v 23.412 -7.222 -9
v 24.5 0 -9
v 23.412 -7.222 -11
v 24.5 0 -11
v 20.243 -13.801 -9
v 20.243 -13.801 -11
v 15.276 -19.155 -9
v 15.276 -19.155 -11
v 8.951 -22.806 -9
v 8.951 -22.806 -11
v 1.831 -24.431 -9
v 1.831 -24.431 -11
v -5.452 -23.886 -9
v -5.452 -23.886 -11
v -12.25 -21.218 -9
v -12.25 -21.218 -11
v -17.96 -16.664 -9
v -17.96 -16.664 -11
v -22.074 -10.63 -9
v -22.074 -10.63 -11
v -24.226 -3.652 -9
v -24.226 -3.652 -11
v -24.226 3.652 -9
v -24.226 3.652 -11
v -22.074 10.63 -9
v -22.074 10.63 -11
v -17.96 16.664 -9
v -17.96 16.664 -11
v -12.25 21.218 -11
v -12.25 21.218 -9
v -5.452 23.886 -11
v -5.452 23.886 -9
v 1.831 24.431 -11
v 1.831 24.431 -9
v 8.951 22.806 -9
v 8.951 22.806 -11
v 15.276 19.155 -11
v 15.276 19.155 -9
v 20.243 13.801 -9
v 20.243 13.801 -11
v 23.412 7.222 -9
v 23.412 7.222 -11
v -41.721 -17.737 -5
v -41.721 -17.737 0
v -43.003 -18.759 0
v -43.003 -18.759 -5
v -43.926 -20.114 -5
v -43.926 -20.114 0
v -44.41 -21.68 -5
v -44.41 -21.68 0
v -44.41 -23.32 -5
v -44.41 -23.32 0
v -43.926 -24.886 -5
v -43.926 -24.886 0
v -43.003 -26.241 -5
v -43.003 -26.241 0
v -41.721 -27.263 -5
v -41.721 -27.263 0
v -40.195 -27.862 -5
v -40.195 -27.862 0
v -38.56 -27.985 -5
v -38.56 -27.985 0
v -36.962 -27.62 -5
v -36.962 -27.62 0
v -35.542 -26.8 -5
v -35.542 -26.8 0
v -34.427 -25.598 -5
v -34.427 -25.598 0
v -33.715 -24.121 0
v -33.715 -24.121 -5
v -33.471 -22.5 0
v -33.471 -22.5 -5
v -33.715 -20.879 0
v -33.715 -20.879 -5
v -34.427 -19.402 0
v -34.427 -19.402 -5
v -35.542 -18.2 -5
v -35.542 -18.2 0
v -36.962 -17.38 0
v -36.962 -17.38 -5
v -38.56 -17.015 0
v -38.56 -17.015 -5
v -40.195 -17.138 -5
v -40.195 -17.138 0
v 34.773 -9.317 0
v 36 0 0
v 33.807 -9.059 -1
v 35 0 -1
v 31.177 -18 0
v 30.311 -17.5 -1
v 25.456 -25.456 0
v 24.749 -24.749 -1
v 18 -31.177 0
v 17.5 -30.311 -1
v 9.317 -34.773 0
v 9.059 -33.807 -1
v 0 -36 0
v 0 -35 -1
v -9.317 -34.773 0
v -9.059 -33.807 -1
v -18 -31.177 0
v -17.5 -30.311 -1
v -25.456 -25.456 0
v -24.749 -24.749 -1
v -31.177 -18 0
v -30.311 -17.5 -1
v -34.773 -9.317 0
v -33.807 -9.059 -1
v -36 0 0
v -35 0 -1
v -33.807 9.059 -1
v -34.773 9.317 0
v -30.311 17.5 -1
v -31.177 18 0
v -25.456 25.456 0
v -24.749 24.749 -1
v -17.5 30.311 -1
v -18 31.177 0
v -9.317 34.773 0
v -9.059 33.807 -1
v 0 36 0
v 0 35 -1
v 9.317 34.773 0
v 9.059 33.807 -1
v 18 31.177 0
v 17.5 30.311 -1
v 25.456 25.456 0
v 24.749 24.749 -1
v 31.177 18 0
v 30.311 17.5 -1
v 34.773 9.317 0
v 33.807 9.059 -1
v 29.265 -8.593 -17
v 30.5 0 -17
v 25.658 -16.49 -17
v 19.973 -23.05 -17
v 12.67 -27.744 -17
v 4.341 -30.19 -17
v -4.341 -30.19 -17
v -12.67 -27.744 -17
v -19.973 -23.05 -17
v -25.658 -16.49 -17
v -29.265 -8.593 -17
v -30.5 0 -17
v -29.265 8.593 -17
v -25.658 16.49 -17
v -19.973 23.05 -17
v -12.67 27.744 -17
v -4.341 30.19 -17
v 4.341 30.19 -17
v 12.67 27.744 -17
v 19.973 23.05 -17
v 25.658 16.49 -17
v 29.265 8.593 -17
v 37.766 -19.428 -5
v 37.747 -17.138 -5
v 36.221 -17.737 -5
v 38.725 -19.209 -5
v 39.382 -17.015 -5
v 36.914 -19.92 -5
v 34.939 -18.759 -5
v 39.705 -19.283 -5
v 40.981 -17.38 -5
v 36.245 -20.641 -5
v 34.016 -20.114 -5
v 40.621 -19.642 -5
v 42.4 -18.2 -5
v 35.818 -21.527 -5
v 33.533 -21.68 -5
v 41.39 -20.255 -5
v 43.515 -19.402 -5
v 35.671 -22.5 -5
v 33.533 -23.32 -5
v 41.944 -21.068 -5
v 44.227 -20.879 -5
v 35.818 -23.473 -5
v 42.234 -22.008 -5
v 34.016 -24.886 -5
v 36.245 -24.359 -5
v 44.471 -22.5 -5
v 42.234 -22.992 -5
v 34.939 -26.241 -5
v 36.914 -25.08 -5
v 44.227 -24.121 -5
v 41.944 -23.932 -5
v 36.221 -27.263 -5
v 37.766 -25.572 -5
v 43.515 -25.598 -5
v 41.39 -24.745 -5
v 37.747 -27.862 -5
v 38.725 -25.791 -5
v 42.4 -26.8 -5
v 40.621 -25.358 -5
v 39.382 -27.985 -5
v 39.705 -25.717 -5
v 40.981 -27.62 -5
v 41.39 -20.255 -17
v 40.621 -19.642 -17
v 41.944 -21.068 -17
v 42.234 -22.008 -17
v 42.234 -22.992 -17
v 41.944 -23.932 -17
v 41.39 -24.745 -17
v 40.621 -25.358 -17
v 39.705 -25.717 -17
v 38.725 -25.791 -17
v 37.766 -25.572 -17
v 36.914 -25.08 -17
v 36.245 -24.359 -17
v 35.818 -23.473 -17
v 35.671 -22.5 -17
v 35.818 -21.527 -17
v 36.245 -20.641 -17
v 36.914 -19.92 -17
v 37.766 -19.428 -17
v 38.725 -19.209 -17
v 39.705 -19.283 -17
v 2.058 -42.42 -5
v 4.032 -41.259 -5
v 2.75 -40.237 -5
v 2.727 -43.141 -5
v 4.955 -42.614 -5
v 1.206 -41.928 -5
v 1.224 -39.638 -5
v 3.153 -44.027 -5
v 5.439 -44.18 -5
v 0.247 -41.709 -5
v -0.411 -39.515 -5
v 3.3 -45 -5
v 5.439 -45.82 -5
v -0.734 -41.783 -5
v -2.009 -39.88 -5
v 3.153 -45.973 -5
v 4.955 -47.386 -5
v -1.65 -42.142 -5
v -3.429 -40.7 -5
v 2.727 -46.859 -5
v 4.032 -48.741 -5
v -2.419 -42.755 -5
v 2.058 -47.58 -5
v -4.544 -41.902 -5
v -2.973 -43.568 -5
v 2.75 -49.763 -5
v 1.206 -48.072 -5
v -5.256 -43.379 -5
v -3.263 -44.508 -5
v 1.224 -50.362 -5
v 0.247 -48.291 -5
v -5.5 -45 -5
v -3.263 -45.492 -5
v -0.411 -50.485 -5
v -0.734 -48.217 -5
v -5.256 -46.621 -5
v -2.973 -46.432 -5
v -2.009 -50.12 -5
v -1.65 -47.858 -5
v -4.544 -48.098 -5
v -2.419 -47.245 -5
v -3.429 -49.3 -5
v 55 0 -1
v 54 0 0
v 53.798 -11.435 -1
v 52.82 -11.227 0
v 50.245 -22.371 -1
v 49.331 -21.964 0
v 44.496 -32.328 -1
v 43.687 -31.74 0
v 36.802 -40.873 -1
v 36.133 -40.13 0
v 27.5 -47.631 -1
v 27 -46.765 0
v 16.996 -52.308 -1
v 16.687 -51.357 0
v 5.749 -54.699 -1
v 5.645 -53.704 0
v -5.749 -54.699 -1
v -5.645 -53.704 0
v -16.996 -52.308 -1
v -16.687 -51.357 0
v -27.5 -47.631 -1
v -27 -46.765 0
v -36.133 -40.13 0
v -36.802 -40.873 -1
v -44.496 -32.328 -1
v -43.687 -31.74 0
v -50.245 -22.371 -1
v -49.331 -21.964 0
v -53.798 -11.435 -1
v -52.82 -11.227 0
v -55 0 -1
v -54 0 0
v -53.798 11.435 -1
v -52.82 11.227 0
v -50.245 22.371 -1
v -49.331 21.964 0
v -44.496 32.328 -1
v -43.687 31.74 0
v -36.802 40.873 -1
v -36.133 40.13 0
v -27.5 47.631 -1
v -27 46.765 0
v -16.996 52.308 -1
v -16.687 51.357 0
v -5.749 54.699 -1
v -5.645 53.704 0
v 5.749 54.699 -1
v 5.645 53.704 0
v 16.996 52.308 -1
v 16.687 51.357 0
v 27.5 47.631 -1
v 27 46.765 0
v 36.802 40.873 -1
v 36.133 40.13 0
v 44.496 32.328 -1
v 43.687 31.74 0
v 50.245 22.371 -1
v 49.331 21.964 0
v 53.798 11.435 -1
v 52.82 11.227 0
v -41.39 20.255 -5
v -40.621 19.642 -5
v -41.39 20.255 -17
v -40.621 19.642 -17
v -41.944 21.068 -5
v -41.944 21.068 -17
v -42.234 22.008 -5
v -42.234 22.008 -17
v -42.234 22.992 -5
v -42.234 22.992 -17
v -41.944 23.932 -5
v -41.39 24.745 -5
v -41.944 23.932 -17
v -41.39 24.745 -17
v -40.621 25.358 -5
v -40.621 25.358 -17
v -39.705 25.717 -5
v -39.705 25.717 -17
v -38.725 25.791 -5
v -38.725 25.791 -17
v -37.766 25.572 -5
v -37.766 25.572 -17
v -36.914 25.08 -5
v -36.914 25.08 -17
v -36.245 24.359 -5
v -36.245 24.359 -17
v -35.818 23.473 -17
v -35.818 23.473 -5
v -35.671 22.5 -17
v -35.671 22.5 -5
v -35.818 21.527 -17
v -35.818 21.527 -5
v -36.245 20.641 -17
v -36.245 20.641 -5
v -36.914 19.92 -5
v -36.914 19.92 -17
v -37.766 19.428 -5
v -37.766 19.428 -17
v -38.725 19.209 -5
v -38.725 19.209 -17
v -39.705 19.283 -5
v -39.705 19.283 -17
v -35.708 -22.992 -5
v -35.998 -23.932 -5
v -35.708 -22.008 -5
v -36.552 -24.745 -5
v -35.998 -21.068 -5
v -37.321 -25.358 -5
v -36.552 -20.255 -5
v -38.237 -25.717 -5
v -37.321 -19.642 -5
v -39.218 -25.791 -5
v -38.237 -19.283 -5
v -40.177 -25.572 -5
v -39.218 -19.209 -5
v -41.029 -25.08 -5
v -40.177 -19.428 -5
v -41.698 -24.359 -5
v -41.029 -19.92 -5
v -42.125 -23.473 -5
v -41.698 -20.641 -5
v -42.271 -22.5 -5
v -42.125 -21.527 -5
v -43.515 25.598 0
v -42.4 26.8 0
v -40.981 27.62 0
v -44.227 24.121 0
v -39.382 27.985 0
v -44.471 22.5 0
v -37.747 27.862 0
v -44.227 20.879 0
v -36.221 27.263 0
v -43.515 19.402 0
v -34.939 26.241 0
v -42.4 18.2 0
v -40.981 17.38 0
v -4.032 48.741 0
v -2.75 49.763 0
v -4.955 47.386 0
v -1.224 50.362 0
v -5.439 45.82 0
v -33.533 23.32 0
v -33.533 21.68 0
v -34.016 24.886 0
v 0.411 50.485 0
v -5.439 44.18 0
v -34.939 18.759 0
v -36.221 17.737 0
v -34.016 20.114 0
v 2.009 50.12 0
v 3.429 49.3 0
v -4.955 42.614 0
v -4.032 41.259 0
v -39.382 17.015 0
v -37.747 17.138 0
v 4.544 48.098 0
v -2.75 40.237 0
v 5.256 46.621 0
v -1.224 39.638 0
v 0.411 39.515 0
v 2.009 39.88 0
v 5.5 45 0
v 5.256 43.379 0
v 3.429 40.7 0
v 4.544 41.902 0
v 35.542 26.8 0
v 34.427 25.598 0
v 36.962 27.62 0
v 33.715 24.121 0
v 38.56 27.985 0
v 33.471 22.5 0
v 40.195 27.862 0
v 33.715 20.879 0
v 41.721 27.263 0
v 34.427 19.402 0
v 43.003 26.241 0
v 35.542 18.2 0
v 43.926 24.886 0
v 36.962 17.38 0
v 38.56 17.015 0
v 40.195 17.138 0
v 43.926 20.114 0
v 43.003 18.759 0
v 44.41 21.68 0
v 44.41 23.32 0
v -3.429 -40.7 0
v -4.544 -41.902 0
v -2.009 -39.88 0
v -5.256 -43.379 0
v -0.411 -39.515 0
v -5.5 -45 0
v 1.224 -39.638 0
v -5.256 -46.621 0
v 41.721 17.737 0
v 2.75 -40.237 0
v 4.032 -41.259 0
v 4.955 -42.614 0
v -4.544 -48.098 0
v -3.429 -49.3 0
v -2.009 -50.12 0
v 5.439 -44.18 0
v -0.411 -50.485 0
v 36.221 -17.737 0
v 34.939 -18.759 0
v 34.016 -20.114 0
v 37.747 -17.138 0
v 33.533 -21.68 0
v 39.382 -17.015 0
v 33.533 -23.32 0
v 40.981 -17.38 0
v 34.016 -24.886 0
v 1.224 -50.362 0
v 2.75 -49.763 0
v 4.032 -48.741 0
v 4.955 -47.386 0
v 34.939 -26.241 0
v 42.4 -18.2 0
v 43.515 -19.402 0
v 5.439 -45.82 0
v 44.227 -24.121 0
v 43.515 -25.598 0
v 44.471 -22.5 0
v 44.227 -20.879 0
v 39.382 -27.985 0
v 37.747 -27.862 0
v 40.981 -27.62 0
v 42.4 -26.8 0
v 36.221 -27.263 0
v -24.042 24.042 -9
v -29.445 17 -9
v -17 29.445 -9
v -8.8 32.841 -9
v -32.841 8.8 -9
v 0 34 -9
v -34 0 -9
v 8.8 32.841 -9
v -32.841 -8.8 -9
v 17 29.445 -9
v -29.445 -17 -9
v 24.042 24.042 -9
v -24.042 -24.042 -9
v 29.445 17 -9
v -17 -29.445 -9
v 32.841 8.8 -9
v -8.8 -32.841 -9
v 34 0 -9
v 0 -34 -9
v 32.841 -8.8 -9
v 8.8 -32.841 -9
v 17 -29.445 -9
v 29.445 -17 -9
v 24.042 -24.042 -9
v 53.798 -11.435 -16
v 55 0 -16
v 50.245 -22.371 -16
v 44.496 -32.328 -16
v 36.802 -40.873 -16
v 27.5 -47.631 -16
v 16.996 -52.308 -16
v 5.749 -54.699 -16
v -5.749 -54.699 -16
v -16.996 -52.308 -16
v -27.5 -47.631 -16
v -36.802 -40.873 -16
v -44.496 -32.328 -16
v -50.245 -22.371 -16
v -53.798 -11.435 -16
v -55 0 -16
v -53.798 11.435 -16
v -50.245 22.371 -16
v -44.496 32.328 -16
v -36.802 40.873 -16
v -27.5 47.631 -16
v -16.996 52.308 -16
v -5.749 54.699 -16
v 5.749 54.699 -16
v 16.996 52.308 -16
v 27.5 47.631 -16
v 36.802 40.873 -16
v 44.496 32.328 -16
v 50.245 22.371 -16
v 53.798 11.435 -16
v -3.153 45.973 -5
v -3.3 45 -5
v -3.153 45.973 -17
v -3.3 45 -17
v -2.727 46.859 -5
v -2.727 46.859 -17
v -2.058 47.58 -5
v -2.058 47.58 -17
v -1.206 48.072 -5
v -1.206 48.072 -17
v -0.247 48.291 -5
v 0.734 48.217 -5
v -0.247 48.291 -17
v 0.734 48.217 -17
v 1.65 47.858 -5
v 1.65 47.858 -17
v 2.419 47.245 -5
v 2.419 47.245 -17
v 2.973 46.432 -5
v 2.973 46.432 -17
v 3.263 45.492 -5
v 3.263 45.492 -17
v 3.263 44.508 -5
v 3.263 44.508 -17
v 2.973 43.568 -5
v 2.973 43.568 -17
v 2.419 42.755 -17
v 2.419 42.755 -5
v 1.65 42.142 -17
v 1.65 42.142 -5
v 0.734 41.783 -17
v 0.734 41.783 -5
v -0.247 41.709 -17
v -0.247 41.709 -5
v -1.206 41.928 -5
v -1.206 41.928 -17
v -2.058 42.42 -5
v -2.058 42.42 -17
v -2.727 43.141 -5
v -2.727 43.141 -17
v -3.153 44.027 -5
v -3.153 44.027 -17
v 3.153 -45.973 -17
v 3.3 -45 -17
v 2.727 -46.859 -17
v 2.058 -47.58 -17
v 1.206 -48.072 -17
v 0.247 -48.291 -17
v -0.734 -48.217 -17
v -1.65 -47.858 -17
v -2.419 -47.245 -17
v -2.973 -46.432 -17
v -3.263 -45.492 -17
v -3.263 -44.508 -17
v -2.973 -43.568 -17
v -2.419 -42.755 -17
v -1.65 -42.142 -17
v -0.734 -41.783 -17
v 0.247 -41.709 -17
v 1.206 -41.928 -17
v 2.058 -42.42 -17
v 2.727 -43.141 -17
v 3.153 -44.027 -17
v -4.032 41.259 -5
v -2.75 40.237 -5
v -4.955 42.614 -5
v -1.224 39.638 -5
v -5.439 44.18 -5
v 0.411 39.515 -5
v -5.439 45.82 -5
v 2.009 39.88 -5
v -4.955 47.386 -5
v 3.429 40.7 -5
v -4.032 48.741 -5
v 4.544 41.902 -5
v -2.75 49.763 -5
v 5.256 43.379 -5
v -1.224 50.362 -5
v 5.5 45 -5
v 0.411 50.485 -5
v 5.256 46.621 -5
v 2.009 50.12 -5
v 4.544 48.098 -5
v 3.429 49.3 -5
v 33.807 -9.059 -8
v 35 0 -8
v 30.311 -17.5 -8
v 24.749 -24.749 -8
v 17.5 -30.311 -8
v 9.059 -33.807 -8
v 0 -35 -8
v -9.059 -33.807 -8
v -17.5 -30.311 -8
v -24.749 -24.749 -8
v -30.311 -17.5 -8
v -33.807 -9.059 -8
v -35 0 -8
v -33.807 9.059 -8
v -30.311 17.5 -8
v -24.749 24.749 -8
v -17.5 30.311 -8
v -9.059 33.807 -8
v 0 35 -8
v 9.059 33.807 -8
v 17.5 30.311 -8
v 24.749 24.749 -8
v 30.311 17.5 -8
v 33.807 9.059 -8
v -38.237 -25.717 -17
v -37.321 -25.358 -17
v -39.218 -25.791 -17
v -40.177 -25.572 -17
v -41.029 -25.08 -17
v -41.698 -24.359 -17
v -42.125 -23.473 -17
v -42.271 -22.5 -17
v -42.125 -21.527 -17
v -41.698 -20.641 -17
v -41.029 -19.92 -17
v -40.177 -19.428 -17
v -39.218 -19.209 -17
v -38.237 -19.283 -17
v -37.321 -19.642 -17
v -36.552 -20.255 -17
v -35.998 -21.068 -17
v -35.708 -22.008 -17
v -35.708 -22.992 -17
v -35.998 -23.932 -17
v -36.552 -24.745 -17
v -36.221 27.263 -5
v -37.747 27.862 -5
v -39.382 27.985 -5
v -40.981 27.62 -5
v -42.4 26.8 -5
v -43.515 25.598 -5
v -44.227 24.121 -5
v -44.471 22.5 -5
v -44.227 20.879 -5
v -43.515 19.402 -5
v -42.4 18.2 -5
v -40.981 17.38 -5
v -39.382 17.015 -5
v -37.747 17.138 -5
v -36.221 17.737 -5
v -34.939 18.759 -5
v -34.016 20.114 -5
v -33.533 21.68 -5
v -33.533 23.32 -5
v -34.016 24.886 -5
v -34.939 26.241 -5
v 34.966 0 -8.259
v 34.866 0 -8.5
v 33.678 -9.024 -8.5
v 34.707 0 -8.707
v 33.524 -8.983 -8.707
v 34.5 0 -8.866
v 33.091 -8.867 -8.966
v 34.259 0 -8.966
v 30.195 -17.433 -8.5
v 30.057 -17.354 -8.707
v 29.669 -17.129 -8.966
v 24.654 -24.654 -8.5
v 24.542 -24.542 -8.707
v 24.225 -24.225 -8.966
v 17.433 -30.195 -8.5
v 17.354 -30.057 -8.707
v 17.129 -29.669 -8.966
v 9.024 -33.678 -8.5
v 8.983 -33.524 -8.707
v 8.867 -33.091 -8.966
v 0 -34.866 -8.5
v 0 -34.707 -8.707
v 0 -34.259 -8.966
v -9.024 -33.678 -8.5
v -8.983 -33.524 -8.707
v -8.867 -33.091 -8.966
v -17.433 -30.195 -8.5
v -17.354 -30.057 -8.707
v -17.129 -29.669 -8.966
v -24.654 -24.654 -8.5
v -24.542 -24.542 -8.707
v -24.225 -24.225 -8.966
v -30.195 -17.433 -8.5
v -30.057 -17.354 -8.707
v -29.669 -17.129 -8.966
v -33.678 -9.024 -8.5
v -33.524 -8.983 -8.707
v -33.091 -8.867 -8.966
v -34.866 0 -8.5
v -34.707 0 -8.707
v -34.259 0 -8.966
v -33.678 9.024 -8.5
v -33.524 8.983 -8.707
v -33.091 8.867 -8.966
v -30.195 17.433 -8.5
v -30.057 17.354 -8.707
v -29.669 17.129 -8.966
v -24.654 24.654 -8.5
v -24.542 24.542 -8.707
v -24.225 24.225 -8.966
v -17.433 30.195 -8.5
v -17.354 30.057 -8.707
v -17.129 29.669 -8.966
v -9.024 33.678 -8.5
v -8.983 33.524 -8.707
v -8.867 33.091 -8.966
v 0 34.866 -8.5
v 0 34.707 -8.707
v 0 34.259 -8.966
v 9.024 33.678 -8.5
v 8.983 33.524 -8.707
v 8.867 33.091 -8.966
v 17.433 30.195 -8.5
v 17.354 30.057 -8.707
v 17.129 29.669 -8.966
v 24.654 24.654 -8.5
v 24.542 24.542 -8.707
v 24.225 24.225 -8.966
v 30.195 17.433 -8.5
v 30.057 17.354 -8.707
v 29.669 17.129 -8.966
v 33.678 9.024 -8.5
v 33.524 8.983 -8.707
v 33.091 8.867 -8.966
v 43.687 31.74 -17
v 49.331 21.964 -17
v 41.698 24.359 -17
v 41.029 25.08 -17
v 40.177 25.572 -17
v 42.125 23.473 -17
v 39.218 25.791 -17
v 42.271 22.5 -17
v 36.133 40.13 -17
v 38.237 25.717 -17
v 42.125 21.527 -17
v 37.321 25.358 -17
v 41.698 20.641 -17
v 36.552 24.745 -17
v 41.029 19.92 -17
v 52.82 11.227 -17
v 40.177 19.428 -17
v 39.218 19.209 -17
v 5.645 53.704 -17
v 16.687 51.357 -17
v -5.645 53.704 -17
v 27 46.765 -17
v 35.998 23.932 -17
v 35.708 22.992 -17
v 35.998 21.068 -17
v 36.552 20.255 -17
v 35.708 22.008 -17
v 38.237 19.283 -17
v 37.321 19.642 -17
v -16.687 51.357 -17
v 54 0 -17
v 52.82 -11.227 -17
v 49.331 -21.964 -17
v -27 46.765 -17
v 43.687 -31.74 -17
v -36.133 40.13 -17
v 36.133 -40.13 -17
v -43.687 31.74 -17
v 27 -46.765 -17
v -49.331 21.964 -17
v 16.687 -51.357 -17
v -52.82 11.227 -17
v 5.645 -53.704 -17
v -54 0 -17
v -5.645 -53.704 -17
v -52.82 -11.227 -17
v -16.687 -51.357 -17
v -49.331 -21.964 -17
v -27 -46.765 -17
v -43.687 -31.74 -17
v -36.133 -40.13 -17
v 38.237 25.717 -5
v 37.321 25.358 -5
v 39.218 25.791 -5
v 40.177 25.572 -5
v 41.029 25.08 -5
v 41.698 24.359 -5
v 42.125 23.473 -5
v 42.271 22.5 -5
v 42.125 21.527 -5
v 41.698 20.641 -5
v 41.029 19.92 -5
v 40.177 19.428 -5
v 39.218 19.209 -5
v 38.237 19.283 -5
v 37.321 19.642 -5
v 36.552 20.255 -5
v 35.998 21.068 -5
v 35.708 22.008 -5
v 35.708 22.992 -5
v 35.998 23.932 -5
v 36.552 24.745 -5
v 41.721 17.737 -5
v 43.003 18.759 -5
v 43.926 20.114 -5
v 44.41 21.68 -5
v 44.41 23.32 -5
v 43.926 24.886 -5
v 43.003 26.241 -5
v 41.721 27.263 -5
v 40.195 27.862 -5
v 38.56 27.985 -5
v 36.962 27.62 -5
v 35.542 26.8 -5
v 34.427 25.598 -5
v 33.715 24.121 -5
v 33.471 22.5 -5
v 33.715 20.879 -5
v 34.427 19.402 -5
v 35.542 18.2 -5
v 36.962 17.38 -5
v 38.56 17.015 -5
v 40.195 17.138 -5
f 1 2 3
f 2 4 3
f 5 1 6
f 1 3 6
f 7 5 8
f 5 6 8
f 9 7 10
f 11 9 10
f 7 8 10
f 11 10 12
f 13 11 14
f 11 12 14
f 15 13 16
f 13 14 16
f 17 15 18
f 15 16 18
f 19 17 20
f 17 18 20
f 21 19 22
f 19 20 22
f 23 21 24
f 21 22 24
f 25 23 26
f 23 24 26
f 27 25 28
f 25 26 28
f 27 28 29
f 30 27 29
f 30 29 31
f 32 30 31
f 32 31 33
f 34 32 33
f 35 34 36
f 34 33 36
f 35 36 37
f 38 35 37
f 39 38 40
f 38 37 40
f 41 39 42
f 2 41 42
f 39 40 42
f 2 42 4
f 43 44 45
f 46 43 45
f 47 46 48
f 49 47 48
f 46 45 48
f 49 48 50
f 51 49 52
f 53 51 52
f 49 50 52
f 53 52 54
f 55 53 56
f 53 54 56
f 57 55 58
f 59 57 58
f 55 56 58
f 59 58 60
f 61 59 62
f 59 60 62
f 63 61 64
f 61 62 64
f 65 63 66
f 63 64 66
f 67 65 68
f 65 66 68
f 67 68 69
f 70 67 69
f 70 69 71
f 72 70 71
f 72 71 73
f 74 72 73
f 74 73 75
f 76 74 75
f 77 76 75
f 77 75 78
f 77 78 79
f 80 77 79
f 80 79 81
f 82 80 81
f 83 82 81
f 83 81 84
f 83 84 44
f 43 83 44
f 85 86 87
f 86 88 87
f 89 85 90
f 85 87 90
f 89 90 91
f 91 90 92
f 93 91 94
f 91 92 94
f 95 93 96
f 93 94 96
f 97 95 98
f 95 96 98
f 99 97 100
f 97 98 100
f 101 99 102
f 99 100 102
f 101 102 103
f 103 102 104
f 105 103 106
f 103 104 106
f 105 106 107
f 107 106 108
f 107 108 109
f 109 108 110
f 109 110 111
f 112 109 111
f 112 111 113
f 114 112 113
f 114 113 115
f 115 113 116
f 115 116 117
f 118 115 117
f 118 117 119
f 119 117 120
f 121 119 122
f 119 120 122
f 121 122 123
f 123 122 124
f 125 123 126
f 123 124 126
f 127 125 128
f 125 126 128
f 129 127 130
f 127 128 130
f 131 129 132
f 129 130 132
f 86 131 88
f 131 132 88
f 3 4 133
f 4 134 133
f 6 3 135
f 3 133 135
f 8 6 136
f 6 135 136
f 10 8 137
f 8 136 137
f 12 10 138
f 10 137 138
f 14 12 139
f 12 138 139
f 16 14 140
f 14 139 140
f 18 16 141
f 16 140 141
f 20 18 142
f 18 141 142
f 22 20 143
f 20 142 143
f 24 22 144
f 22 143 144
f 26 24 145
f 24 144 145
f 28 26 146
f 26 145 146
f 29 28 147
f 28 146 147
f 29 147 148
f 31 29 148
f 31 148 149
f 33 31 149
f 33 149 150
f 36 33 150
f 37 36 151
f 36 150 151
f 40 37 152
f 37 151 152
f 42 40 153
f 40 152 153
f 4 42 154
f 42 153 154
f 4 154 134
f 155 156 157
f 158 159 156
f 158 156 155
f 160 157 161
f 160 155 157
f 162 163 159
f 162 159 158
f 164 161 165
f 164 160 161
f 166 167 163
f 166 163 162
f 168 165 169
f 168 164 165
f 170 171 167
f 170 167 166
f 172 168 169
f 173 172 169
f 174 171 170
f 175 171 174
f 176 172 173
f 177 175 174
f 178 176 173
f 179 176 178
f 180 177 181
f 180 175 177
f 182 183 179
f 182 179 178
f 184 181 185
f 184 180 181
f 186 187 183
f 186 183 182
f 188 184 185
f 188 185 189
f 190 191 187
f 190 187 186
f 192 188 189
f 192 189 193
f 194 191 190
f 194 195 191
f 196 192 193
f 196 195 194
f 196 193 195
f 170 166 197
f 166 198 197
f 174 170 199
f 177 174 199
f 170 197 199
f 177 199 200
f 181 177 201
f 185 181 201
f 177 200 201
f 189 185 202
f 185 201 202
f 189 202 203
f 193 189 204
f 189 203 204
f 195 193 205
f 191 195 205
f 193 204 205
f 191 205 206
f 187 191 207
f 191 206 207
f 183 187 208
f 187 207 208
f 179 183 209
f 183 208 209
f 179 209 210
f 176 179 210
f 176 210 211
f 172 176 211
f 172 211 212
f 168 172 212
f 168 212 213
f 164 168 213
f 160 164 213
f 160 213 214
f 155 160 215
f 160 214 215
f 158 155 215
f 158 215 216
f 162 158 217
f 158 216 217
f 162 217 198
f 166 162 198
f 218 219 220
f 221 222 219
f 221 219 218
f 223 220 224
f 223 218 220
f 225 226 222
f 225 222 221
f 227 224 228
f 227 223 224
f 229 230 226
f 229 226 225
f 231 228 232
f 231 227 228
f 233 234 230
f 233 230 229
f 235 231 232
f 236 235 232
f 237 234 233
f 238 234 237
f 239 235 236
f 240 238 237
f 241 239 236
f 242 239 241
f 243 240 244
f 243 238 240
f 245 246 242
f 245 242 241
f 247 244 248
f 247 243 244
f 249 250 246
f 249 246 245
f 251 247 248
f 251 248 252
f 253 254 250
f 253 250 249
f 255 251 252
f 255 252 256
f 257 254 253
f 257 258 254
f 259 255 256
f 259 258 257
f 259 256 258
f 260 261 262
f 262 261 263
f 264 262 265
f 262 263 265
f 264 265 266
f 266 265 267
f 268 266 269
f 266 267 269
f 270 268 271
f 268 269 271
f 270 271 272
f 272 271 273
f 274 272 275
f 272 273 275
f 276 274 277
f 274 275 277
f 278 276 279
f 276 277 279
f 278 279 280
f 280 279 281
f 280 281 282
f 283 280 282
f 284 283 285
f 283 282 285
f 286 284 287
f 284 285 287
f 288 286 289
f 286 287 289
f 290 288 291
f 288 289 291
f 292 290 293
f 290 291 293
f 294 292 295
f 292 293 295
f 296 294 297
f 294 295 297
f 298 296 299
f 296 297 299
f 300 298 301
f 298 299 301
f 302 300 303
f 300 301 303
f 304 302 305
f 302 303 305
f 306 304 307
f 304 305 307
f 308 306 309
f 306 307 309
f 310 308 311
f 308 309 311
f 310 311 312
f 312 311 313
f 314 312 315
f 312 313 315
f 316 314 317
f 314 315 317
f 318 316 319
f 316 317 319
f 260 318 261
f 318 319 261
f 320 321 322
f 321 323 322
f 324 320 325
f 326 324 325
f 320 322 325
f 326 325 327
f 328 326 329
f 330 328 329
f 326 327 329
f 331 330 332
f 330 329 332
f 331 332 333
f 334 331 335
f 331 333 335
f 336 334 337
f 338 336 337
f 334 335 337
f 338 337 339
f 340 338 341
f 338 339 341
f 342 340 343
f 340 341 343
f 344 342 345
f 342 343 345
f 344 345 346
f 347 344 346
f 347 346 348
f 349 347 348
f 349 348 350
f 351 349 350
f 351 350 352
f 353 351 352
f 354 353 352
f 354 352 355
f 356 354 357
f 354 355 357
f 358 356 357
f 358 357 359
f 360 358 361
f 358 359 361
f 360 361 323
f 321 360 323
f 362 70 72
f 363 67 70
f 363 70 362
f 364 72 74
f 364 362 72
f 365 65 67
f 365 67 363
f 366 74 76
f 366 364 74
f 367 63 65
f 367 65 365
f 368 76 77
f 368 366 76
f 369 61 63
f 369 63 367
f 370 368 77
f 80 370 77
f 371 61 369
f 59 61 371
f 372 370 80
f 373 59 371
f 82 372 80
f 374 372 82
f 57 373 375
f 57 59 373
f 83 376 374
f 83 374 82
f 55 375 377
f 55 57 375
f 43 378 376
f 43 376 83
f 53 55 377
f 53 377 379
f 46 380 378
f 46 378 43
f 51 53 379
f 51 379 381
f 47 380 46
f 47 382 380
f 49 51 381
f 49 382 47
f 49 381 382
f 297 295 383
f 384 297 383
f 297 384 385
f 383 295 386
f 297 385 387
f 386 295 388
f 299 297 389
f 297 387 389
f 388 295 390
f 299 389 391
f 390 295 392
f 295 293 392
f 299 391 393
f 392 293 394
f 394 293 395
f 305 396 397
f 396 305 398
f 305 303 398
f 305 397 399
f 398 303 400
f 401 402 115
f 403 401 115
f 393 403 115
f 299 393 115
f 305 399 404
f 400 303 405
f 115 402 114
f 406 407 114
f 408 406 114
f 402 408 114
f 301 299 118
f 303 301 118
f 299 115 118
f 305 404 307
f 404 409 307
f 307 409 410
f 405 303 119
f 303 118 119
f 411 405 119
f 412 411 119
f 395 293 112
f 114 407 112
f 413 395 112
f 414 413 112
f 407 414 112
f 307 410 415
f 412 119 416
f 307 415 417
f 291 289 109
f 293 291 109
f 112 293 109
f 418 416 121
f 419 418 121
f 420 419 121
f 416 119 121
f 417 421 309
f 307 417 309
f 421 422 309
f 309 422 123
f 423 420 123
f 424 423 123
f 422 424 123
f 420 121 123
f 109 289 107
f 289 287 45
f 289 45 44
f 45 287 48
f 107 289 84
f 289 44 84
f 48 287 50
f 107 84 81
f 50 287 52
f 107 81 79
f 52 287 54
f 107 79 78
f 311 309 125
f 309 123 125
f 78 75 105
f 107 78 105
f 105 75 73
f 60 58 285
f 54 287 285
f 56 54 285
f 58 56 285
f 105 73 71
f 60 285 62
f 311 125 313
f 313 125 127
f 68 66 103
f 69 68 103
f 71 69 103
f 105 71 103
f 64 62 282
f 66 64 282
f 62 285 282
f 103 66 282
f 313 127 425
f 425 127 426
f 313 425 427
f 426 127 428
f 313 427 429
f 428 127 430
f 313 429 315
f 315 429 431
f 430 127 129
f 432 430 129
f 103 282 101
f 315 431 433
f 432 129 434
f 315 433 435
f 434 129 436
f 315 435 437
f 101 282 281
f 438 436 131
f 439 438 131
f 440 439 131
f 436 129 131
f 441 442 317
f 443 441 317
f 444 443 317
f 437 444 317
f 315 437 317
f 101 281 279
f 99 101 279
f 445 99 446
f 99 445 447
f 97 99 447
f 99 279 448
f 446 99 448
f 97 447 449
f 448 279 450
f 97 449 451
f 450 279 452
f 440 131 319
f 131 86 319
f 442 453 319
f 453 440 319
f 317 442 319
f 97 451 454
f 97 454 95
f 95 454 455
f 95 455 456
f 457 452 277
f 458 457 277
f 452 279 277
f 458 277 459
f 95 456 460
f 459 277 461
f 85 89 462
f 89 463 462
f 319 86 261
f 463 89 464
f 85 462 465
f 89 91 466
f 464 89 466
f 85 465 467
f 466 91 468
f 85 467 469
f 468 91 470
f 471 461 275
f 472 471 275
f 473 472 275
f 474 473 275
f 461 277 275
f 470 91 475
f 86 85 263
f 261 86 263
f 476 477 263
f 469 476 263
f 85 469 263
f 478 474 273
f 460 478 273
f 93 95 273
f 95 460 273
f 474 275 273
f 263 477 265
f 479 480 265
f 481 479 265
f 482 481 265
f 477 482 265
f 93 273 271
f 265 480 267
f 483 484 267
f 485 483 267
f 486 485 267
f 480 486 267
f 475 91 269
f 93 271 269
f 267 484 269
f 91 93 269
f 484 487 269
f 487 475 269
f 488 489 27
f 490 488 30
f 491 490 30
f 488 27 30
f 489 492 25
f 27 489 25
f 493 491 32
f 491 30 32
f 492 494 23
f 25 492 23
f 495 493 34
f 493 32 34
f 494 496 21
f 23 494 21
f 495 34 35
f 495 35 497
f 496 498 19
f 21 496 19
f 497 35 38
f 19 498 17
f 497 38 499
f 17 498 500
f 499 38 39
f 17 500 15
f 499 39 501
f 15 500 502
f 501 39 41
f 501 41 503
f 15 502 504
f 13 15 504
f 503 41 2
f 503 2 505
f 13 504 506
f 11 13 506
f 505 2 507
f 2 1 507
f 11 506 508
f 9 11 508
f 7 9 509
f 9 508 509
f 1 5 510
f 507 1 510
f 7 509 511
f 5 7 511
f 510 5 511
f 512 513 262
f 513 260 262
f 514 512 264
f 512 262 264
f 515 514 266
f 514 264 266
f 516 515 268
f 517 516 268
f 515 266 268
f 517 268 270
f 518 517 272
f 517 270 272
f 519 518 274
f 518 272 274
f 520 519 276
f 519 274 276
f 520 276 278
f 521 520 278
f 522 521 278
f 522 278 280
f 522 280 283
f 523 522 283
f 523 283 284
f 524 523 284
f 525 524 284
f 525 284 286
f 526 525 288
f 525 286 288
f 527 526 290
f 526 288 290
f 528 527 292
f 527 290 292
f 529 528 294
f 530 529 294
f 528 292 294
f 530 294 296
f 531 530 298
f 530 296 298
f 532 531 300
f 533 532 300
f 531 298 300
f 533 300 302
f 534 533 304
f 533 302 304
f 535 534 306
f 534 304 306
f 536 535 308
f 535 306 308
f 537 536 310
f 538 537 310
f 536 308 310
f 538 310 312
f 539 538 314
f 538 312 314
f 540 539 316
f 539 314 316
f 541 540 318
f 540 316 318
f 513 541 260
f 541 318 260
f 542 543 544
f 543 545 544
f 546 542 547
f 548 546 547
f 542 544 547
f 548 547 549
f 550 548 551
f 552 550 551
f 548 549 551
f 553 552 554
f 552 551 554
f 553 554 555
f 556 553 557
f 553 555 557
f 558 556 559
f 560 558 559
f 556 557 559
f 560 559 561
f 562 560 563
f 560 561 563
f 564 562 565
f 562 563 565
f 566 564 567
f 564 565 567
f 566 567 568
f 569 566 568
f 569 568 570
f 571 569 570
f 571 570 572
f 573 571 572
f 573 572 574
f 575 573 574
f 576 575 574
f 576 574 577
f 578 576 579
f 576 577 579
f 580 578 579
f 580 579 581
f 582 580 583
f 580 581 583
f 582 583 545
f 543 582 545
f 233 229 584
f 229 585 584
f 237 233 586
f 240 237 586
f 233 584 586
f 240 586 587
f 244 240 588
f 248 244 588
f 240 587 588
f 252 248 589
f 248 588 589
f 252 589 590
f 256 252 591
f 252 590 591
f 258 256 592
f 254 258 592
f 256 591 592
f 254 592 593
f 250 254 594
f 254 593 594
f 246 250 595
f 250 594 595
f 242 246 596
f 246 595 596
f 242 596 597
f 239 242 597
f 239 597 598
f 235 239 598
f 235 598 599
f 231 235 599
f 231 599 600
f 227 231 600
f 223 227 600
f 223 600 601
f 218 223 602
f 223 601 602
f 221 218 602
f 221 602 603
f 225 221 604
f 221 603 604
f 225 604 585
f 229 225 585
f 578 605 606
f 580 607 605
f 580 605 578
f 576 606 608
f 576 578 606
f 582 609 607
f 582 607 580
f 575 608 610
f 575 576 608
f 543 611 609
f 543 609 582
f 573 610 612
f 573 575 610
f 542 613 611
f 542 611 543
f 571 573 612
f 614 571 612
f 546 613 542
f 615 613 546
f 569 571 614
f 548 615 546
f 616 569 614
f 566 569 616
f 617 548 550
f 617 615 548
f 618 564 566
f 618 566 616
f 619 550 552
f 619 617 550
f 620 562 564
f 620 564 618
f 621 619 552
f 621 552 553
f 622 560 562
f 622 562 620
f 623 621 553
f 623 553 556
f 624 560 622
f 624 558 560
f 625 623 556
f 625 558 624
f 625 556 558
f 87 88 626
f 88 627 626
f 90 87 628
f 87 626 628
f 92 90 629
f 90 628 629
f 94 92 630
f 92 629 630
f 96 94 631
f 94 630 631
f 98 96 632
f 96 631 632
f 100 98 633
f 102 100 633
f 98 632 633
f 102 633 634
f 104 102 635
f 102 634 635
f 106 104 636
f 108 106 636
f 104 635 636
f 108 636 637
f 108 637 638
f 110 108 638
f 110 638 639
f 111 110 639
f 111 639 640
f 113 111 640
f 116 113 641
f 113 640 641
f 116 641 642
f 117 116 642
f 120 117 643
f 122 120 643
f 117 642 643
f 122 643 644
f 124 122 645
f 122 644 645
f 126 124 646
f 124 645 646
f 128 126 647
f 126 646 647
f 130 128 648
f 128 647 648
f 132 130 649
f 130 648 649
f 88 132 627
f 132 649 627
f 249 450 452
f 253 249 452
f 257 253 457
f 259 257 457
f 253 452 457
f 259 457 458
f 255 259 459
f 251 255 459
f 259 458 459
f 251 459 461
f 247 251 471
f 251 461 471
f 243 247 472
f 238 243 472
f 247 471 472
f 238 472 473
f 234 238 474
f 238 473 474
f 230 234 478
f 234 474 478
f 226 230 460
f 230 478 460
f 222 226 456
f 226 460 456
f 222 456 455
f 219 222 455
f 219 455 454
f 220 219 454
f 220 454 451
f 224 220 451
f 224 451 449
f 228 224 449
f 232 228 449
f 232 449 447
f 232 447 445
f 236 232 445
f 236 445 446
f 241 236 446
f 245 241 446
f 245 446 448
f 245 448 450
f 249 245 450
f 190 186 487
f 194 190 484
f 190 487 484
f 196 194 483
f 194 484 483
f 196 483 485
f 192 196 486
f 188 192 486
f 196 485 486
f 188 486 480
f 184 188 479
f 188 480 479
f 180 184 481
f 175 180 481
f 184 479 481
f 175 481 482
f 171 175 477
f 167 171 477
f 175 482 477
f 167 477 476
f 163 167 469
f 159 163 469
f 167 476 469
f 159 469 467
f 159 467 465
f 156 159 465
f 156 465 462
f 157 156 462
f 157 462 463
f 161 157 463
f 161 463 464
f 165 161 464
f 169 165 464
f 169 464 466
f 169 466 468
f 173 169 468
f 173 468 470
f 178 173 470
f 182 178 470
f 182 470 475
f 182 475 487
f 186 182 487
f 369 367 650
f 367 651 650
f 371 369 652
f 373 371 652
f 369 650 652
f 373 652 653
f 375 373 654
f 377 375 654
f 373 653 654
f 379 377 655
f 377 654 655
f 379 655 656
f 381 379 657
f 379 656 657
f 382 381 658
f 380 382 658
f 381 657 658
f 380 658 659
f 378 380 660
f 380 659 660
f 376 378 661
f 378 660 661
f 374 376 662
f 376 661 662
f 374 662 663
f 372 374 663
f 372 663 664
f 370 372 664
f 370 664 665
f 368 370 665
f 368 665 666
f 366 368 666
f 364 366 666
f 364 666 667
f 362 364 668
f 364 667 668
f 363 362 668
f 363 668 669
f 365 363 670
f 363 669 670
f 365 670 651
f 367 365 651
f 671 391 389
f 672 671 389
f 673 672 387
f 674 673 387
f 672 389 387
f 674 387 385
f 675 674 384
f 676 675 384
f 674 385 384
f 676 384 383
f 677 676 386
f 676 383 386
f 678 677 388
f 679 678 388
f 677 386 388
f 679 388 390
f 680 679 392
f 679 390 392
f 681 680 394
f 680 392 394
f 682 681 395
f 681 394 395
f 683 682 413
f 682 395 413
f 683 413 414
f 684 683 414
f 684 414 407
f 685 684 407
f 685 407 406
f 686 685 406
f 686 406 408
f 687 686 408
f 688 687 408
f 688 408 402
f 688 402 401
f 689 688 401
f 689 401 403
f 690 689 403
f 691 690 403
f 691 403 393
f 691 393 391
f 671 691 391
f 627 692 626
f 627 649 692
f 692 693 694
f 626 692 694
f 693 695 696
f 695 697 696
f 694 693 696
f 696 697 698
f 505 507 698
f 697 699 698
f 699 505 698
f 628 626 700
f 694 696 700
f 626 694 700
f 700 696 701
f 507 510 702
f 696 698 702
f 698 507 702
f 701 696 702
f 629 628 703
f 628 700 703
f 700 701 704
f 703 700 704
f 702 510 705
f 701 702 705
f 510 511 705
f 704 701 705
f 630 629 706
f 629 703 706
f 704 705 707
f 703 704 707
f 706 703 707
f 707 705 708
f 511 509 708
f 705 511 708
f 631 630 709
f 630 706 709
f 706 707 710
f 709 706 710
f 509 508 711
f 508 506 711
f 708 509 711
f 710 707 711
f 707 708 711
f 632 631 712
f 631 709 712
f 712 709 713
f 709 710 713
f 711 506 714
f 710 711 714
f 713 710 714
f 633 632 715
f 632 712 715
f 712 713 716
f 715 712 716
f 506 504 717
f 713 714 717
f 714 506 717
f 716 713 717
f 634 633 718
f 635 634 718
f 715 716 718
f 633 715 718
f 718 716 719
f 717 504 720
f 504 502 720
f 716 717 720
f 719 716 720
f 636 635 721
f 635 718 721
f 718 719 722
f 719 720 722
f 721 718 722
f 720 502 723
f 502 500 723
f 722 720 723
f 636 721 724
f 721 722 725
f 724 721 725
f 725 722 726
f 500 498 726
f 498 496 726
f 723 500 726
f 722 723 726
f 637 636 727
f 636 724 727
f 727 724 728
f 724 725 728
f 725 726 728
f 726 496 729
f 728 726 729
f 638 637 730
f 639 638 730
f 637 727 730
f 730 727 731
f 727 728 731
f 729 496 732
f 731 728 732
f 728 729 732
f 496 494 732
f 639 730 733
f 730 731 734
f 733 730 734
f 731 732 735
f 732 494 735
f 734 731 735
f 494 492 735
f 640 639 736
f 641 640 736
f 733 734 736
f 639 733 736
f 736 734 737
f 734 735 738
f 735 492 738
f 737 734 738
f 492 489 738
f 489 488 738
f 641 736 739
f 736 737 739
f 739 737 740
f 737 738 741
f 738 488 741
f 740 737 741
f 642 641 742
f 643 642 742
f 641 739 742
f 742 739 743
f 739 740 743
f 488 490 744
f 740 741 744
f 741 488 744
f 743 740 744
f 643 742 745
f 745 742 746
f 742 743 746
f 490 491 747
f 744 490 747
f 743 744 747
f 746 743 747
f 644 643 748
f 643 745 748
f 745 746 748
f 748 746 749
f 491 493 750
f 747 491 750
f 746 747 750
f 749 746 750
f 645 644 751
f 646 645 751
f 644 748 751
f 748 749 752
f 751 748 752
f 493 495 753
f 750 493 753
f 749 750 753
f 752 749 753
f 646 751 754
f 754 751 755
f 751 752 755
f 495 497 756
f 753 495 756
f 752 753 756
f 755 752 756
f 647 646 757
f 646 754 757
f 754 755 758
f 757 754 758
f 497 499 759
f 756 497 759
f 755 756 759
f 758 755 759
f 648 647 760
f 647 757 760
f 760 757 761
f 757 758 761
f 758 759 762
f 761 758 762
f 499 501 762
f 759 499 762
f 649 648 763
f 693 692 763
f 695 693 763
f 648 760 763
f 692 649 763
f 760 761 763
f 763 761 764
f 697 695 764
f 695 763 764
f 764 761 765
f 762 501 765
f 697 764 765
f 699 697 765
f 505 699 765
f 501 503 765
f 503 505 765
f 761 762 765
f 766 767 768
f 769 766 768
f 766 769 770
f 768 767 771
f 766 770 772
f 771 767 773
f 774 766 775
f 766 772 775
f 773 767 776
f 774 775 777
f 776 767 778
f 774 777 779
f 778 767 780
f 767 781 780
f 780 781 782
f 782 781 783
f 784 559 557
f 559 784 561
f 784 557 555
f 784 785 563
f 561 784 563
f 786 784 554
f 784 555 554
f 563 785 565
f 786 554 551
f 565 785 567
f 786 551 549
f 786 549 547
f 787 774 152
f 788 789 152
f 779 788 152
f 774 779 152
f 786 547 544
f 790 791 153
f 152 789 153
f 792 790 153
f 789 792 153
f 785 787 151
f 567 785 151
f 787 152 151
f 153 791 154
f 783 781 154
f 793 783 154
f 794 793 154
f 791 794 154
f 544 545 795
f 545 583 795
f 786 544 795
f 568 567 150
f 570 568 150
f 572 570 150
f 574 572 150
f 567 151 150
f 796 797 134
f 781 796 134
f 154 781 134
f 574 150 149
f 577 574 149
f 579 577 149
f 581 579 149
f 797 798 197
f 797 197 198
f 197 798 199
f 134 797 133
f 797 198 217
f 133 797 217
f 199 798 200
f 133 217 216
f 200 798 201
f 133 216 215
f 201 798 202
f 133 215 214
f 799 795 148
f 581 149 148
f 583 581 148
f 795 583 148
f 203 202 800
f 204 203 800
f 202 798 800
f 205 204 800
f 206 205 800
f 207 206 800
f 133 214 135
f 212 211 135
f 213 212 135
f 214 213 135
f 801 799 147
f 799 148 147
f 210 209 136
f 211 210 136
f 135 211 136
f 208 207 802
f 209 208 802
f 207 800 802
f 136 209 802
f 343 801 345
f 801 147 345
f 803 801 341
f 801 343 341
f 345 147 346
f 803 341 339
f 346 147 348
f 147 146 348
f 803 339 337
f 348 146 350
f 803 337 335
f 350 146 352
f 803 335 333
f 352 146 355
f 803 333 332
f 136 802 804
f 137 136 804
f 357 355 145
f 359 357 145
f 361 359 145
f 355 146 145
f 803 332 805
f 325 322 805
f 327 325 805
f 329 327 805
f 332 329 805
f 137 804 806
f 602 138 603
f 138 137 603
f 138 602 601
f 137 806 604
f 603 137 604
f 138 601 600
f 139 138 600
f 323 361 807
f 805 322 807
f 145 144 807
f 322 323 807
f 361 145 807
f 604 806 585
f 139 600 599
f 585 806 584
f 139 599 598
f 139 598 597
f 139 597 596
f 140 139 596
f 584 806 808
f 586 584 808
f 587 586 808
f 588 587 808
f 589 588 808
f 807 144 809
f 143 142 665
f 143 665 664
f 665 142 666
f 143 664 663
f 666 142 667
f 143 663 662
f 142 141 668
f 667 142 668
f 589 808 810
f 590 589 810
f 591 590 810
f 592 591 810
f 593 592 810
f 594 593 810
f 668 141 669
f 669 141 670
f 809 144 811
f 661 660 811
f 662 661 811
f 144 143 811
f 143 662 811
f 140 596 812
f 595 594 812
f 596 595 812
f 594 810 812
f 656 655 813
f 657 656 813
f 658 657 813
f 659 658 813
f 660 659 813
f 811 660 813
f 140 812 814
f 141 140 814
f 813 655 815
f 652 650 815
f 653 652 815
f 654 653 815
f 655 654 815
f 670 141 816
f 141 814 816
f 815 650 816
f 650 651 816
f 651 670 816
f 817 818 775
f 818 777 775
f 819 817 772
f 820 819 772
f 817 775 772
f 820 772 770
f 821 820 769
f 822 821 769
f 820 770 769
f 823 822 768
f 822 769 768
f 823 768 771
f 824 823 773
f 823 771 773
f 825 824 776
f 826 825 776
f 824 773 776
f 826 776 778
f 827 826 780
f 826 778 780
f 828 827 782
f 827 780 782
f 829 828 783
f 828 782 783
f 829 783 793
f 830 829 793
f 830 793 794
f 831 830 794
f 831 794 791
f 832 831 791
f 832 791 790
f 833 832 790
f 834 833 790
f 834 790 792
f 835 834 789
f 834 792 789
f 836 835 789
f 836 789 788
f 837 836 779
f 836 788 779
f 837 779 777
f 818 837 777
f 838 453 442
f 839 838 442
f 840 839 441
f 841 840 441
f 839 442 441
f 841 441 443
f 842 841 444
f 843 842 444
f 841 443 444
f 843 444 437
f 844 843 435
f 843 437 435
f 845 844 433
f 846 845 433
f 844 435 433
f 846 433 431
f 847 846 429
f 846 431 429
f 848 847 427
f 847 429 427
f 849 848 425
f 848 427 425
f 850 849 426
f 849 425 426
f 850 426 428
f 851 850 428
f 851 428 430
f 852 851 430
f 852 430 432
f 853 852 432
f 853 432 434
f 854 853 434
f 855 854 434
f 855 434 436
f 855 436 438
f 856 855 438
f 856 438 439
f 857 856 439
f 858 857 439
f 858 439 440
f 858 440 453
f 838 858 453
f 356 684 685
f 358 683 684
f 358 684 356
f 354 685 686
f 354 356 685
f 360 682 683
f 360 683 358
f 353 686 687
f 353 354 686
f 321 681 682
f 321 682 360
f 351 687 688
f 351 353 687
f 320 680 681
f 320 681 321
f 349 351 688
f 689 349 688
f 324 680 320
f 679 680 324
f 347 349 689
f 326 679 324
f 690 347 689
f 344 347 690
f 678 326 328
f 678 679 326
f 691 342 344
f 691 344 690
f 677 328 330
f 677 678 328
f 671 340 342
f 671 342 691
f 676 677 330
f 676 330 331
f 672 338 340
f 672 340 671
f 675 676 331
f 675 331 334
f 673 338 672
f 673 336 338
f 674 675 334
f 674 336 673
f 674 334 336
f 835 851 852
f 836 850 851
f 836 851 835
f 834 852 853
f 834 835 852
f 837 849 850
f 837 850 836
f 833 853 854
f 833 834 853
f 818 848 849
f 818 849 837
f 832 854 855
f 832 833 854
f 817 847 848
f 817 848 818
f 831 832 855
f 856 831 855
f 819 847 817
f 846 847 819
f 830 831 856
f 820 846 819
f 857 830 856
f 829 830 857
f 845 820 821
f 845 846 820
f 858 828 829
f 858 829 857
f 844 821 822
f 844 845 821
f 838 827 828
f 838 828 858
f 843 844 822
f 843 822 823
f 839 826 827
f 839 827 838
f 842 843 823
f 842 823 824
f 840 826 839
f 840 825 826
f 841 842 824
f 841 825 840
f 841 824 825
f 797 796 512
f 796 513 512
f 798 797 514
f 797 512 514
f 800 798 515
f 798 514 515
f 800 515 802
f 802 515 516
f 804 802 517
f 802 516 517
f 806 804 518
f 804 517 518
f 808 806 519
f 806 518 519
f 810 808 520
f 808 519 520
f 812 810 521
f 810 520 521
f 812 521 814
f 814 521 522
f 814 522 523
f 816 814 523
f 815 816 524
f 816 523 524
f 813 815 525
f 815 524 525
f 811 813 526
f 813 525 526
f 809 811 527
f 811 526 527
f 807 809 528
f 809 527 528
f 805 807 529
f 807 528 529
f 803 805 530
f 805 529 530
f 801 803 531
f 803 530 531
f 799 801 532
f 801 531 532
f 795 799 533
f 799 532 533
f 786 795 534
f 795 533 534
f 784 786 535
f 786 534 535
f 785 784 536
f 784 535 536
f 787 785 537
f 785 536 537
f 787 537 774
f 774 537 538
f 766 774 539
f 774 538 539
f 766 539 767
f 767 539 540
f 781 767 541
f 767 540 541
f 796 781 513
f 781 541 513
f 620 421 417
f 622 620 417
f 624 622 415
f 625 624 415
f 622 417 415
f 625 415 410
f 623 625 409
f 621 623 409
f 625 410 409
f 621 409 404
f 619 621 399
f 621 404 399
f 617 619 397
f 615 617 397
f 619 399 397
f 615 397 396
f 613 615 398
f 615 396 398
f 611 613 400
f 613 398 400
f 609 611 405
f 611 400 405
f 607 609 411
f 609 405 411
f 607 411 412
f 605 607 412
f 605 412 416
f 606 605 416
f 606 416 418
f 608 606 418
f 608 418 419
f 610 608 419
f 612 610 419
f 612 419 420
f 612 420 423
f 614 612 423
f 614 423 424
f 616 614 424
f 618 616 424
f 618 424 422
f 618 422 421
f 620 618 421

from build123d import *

# Parameters (mm, degrees)
CBORE_FOR_M6_HEX_SOCKET_HEAD_CAP_SCREW1_D           = 6.6
CBORE_FOR_M6_HEX_SOCKET_HEAD_CAP_SCREW1_CBORE_D     = 11
CBORE_FOR_M6_HEX_SOCKET_HEAD_CAP_SCREW1_CBORE_DEPTH = 5
CIRPATTERN1_COUNT                                   = 6


with BuildPart() as part:
    # Sketch1 → Revolve1 (revolve)
    with BuildSketch(Plane(origin=(0, 0, 0), x_dir=(0, 0, -1), z_dir=(1, 0, 0)), mode=Mode.PRIVATE) as revolve1_sk:
        with BuildLine():
            Line((9, 24.5), (11, 24.5))
            Line((11, 24.5), (17, 30.5))
            Line((17, 30.5), (17, 54))
            Line((17, 54), (16, 55))
            Line((16, 55), (1, 55))
            Line((1, 55), (0, 54))
            Line((0, 54), (0, 36))
            Line((0, 36), (1, 35))
            Line((1, 35), (8, 35))
            ThreePointArc((8, 35), (8.707106781, 34.707106781), (9, 34))
            Line((9, 34), (9, 24.5))
        make_face()
    revolve(revolve1_sk.sketch.rotate(Axis((0, 0, 0), (0, 0, -1)), 90), axis=Axis((0, 0, 0), (0, 0, -1)))

    # CBORE for M6 Hex Socket Head Cap Screw1 (through all)
    with Locations(Plane.XY):
        with Locations((0, 45)):
            cbore_for_m6_hex_socket_head_cap_screw1 = CounterBoreHole(CBORE_FOR_M6_HEX_SOCKET_HEAD_CAP_SCREW1_D / 2, CBORE_FOR_M6_HEX_SOCKET_HEAD_CAP_SCREW1_CBORE_D / 2, CBORE_FOR_M6_HEX_SOCKET_HEAD_CAP_SCREW1_CBORE_DEPTH)

    # CirPattern1: CBORE for M6 Hex Socket Head Cap Screw1 ×6 about axis
    cirpattern1_axis = Axis((0, 0, 0), (0, 0, 1))
    for i in range(1, CIRPATTERN1_COUNT):
        add(cbore_for_m6_hex_socket_head_cap_screw1.rotate(cirpattern1_axis, i * 360 / CIRPATTERN1_COUNT), mode=Mode.SUBTRACT)


solid = part.part
